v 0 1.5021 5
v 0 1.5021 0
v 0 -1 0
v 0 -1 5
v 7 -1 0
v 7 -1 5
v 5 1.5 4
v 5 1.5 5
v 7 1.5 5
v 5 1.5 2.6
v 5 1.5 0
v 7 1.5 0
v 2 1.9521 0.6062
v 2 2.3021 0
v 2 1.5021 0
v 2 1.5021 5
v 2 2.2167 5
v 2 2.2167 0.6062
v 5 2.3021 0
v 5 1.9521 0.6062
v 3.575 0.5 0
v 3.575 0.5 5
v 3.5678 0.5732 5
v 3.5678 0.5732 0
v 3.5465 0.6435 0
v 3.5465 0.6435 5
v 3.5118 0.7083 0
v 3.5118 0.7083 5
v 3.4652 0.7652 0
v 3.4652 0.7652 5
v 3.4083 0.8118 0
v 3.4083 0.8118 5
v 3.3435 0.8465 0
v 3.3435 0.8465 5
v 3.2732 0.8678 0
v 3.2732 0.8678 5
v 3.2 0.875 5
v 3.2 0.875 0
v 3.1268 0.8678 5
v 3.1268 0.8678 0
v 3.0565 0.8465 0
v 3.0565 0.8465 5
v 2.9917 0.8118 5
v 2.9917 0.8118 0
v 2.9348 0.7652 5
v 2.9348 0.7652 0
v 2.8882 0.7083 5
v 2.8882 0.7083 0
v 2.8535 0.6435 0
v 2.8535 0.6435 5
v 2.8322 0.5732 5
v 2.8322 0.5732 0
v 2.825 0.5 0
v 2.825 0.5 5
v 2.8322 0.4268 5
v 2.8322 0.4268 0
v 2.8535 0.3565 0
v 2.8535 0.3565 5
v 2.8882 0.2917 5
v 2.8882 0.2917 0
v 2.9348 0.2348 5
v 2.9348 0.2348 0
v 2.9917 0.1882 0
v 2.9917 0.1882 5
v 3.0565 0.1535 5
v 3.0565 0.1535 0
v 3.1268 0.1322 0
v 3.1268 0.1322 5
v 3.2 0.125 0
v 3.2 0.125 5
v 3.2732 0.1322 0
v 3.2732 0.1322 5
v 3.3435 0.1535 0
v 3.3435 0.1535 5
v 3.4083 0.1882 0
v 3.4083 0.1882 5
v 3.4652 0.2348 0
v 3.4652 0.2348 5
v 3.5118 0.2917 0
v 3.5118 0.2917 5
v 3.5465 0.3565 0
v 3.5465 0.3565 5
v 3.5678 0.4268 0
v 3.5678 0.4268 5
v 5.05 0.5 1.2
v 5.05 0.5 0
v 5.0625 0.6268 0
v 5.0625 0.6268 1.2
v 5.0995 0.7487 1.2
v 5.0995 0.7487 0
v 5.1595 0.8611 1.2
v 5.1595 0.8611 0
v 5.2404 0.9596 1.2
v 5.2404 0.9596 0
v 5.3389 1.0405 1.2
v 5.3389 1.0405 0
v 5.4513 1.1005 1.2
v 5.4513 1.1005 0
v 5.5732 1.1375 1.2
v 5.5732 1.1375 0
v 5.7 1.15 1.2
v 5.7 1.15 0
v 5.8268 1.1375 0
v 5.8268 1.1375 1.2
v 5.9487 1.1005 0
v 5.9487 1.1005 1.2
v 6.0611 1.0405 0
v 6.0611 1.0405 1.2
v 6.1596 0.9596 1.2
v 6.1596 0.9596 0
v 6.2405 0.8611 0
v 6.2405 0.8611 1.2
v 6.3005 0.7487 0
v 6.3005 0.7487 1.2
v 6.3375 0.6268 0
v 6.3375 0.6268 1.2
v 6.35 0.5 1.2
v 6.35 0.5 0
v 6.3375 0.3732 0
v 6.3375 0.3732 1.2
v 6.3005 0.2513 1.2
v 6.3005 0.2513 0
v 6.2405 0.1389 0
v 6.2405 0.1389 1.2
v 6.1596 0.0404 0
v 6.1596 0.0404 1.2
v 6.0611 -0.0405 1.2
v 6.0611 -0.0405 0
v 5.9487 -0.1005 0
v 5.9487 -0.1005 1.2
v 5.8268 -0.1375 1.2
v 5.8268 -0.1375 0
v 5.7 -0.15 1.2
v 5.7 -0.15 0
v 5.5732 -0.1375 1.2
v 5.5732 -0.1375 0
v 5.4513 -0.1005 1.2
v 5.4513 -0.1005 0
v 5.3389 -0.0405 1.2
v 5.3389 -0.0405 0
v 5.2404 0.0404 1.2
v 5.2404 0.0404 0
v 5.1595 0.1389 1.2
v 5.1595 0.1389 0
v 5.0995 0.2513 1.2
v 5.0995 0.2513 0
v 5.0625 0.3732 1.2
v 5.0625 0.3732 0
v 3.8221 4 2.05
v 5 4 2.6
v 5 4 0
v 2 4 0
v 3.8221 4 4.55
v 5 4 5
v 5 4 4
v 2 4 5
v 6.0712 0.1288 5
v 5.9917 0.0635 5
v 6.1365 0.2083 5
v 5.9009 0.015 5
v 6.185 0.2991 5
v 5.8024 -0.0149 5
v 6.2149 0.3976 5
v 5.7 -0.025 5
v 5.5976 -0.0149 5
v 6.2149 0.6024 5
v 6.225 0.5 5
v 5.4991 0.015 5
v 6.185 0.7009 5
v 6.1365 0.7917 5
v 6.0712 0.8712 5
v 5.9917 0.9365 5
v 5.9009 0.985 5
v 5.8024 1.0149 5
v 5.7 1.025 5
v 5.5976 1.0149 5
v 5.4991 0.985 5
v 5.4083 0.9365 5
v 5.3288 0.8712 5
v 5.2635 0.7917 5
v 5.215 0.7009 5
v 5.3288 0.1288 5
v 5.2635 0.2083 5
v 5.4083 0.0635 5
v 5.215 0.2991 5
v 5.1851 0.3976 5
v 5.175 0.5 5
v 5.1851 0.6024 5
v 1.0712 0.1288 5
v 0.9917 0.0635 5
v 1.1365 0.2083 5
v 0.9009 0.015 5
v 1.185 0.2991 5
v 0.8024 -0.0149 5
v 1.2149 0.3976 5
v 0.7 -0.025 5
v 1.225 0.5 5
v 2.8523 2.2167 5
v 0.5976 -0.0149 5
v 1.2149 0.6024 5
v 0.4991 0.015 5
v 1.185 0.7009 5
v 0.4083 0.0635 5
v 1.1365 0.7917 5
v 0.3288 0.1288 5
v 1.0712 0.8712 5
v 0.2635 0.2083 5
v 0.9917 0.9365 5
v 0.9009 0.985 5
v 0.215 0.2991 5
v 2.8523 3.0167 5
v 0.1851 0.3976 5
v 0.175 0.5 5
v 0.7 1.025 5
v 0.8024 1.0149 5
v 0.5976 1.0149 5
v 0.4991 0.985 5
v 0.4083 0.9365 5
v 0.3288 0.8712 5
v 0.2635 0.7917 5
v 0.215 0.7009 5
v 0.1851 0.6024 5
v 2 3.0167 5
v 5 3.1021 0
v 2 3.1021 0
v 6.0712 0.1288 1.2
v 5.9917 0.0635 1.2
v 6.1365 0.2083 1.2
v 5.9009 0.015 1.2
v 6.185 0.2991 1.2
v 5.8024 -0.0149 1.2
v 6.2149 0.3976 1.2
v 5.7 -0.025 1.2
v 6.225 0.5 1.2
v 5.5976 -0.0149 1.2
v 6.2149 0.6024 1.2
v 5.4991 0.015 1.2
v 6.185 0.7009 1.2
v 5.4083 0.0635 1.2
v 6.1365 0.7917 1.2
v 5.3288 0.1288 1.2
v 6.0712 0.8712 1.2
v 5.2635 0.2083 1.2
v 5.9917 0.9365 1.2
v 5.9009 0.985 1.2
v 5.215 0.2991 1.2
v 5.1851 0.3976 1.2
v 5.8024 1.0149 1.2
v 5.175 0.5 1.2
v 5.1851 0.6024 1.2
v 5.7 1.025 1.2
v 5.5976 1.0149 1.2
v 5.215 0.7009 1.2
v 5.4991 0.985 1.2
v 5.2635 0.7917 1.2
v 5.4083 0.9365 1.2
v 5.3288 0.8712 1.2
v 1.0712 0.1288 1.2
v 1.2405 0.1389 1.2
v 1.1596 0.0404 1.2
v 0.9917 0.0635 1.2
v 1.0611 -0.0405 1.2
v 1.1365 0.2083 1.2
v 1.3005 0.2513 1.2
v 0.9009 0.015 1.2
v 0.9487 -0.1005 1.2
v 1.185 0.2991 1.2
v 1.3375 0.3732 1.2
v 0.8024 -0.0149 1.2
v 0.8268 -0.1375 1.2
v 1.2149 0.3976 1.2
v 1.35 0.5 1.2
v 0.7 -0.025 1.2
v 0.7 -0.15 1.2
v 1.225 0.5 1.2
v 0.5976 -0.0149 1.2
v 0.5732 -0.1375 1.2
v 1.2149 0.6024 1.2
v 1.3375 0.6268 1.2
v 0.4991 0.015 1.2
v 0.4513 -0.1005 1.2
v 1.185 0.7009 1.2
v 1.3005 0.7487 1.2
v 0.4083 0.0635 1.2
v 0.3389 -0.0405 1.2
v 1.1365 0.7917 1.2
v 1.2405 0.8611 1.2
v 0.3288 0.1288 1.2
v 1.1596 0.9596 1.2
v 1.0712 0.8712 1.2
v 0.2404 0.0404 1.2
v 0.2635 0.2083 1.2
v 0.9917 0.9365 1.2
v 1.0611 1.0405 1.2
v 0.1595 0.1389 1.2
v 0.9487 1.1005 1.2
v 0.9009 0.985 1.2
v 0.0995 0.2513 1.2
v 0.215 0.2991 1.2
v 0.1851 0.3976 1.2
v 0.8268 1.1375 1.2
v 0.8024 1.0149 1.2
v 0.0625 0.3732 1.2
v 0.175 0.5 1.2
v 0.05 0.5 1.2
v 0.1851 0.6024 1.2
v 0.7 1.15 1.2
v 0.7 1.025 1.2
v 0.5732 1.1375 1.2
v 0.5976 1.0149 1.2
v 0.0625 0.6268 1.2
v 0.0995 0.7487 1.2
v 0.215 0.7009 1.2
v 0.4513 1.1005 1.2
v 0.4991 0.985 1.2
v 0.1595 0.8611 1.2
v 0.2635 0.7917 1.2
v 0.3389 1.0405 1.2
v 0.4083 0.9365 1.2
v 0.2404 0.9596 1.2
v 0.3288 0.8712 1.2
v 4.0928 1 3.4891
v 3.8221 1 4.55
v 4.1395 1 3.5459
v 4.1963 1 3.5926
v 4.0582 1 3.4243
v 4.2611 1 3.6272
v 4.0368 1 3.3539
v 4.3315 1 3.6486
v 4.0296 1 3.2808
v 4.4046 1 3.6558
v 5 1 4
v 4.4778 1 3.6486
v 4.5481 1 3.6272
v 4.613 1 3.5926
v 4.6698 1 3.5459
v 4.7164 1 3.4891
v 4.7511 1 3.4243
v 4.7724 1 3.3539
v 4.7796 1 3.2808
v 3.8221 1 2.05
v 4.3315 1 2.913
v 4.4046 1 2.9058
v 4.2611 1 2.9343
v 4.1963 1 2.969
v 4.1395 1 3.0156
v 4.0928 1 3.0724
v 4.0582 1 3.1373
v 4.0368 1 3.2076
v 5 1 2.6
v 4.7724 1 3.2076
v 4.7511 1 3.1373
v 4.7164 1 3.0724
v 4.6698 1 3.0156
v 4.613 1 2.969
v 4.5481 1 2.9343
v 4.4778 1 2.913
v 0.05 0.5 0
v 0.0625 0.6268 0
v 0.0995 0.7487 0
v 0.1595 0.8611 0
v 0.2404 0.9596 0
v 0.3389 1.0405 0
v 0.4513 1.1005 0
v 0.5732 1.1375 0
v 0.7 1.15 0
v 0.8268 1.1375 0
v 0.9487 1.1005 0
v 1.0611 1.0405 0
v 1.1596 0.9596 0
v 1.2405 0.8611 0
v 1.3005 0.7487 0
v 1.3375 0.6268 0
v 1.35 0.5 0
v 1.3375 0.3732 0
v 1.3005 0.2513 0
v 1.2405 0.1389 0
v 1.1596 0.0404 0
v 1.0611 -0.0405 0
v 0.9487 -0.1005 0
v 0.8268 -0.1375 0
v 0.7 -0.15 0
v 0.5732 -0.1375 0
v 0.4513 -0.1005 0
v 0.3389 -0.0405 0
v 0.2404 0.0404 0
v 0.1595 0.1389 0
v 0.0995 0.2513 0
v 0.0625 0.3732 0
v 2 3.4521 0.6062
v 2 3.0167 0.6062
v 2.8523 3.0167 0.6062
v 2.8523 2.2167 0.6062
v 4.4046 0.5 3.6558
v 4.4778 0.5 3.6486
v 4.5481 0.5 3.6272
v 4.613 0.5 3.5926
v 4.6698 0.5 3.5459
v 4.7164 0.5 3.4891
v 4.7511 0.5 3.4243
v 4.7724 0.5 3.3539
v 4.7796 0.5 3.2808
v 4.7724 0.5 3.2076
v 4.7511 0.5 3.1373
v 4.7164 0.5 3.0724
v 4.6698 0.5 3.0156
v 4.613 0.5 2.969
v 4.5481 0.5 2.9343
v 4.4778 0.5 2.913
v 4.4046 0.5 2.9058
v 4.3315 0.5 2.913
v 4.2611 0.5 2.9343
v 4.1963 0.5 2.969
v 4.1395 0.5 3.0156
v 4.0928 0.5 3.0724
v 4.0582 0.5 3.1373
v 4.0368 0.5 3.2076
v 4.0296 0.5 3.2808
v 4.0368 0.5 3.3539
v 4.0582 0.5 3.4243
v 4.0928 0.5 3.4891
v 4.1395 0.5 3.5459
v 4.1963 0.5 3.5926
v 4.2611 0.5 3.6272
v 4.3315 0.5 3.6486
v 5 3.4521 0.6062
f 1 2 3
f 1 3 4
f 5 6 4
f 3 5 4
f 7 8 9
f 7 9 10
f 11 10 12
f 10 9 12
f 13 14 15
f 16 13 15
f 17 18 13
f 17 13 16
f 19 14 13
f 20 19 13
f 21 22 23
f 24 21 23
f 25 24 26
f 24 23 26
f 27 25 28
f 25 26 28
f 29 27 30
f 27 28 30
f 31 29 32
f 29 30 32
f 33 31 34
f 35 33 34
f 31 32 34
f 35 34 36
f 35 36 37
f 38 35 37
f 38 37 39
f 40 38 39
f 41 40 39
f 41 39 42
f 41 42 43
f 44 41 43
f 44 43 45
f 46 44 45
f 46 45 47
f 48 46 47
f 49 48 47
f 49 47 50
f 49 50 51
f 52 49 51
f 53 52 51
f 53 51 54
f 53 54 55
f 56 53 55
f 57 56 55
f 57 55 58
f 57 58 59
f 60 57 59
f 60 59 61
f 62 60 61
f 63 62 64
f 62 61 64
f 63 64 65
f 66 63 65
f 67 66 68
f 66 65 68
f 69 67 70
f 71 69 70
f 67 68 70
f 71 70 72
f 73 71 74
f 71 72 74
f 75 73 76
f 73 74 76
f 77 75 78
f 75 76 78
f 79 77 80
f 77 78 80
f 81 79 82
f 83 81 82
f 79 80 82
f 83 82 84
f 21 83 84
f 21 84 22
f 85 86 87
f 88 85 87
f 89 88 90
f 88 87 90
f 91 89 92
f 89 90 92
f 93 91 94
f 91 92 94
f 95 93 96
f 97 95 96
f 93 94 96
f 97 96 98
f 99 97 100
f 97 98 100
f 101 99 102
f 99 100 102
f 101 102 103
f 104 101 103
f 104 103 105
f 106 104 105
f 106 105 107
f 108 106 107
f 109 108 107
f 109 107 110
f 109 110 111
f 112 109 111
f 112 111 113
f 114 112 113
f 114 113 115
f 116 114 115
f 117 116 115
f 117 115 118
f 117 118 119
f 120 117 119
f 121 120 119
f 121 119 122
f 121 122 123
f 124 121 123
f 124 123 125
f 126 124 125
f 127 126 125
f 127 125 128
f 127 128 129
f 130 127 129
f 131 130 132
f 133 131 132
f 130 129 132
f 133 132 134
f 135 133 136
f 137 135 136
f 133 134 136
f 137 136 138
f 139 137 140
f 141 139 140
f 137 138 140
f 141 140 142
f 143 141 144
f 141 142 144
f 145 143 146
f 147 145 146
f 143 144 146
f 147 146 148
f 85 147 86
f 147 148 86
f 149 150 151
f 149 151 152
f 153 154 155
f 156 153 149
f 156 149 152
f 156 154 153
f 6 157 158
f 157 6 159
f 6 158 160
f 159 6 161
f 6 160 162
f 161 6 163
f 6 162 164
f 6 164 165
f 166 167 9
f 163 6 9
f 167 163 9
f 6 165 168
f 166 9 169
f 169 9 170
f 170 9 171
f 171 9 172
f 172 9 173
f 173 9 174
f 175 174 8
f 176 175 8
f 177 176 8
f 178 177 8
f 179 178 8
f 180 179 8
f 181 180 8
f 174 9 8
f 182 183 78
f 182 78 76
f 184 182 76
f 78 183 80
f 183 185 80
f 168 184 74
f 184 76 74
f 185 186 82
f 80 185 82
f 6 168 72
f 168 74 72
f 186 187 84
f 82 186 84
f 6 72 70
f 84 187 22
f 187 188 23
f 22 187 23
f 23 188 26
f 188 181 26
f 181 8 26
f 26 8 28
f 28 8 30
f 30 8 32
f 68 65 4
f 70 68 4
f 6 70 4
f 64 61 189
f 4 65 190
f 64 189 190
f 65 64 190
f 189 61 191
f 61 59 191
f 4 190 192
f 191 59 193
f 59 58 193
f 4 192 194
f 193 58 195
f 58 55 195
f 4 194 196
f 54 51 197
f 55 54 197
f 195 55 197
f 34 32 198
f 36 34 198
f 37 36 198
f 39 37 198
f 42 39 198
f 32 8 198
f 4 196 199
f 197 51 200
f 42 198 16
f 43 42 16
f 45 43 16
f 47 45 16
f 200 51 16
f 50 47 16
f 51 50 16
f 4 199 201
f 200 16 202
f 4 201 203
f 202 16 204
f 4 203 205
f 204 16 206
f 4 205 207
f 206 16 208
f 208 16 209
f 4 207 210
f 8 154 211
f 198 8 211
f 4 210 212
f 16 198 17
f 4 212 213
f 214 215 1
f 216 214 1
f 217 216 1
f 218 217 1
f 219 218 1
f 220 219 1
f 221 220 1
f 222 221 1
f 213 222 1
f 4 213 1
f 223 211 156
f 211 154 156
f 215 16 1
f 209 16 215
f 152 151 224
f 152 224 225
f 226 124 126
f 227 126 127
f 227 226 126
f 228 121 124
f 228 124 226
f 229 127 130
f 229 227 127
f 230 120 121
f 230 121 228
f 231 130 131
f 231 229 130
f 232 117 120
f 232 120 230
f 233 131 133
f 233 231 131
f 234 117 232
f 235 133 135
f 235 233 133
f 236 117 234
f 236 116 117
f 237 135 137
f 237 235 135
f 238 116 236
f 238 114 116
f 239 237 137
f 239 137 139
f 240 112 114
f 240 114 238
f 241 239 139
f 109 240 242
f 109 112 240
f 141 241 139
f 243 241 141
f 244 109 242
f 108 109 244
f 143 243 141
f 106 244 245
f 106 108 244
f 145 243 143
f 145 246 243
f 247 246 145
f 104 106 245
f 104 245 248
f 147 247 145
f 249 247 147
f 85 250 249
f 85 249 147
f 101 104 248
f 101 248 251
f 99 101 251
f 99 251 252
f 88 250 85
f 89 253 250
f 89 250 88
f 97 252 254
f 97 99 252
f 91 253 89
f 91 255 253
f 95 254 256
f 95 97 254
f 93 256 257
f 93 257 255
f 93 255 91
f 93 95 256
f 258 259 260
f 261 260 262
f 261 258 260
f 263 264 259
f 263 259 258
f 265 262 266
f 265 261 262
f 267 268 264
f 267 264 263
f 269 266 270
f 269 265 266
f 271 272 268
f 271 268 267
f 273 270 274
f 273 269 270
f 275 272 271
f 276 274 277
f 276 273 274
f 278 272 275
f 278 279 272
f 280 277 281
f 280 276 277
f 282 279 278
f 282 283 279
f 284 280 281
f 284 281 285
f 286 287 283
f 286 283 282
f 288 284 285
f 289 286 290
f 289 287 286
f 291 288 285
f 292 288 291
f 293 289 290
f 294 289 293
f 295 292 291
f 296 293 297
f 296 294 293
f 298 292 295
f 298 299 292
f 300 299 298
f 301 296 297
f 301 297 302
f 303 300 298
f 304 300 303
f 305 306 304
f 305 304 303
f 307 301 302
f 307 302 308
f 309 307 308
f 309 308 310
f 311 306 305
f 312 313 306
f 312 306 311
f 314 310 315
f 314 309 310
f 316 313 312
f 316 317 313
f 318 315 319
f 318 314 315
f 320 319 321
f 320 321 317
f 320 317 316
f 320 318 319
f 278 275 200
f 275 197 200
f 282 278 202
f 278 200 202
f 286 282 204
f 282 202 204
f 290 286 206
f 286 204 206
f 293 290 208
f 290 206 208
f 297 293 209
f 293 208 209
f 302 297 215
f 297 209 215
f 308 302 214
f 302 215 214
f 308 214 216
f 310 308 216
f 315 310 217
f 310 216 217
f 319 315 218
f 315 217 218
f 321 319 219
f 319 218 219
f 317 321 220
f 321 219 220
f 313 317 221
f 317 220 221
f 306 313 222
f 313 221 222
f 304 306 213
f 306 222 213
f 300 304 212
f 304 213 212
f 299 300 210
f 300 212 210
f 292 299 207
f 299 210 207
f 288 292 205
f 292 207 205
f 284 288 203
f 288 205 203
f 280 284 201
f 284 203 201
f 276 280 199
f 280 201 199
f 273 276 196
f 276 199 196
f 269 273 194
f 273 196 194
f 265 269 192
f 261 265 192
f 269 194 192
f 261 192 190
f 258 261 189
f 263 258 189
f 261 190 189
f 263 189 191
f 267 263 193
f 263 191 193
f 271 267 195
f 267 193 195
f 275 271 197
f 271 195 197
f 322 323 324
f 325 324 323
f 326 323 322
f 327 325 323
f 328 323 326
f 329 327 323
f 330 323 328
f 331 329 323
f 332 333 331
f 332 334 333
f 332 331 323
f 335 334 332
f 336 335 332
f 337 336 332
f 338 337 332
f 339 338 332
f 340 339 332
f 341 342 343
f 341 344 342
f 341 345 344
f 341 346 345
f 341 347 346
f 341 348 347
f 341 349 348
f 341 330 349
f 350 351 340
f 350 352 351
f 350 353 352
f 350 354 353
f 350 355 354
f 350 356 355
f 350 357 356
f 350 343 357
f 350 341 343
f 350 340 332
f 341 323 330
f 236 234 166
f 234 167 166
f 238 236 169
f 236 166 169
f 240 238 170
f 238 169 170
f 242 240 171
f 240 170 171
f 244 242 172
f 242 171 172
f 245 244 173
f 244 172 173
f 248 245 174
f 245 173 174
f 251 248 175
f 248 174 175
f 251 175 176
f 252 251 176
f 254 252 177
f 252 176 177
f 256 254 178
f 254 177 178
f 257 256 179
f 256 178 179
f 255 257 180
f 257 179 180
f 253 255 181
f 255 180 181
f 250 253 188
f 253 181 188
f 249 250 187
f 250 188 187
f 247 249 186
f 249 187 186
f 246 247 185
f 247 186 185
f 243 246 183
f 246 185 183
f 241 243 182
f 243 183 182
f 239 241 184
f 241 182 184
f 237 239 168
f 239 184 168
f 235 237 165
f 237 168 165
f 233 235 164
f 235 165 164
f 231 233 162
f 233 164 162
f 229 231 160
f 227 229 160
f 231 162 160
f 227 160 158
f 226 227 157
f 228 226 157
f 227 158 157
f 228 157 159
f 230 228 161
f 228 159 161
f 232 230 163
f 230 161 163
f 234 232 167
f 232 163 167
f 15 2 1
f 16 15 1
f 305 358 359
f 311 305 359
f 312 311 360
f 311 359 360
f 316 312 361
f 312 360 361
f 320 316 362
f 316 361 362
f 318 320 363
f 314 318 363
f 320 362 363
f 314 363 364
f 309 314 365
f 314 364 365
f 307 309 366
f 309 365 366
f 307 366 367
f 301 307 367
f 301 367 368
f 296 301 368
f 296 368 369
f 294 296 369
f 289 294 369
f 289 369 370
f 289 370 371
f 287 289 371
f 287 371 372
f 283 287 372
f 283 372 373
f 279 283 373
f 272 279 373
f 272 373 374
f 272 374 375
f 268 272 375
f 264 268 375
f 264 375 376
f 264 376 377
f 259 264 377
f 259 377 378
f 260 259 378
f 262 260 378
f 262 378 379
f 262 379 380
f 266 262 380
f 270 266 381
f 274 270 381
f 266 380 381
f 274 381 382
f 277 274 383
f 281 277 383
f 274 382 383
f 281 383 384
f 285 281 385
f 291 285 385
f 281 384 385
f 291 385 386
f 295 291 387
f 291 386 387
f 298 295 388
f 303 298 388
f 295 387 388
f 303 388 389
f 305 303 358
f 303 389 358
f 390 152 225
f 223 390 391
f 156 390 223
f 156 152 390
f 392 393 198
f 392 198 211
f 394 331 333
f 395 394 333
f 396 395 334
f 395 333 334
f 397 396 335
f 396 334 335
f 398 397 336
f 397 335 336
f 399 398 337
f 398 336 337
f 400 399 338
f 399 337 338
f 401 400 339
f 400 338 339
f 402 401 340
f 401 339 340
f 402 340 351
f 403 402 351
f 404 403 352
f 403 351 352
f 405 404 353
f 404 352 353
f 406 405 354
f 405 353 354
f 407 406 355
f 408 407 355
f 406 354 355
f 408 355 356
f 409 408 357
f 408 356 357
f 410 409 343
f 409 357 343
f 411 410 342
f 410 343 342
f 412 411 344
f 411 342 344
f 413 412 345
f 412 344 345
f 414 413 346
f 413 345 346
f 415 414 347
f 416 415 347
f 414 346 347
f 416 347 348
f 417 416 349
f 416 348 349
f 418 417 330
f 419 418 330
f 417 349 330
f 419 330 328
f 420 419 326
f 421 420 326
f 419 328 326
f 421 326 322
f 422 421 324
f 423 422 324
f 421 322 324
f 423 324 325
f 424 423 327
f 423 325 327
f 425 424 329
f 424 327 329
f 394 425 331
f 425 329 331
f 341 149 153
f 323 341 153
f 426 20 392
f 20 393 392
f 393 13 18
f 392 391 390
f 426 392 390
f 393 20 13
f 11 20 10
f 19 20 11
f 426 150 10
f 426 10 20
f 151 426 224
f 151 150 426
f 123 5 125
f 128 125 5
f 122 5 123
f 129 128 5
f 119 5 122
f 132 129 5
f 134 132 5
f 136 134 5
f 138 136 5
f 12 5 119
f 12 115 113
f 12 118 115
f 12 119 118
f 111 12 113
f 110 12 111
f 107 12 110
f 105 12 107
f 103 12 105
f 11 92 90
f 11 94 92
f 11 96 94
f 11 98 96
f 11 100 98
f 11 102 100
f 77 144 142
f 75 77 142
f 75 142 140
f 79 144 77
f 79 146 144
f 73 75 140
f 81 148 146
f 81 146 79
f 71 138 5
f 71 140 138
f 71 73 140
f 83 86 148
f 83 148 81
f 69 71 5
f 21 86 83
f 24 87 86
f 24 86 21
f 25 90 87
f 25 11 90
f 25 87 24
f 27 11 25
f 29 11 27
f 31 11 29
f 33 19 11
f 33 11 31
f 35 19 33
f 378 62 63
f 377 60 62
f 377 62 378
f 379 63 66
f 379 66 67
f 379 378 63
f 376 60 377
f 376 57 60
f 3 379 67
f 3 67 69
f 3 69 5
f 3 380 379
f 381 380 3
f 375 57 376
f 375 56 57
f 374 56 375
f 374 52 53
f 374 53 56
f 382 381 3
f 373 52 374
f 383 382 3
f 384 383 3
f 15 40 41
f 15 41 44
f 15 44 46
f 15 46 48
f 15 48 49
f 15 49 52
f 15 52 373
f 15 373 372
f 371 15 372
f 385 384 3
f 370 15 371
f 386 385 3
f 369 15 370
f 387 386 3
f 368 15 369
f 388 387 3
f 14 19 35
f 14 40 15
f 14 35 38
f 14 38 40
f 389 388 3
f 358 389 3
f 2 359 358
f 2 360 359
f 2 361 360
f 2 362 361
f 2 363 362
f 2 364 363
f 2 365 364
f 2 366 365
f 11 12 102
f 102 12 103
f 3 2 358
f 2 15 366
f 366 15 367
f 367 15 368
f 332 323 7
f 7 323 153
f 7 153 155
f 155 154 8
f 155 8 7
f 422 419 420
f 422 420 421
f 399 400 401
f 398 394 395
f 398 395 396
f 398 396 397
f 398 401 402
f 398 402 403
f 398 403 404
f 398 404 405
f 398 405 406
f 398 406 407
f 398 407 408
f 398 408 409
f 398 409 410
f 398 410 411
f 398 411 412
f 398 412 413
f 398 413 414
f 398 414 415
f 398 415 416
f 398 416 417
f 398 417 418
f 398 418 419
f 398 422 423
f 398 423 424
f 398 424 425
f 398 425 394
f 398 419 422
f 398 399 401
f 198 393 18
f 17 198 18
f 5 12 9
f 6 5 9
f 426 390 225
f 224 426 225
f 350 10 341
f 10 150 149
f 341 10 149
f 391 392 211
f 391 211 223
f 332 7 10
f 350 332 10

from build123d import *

# Parameters (mm, degrees)
SKETCH1_W                = 7
SKETCH1_H                = 5
BOSS_EXTRUDE1_DEPTH      = 5
HOLE1_D                  = 1.05
HOLE1_CBORE_D            = 1.3
HOLE1_CBORE_DEPTH        = 1.2
SKETCH20_W               = 5
SKETCH20_H               = 2.5
CUT_EXTRUDE11_DEPTH      = 2
M1_0X0_25_TAPPED_HOLE1_D = 0.75
SKETCH37_W               = 5
SKETCH37_H               = 2.5
CUT_EXTRUDE13_DEPTH      = 2
CUT_EXTRUDE15_DEPTH      = 3
CUT_EXTRUDE16_DEPTH      = 9.124038405
SKETCH45_R               = 0.375
CUT_EXTRUDE18_DEPTH      = 0.5
SKETCH44_W               = 0.852349788
SKETCH44_H               = 0.8
CUT_EXTRUDE19_DEPTH      = 4.5


with BuildPart() as part:
    # Sketch1 → Boss-Extrude1 (new body)
    with BuildSketch(Plane(origin=(0, 4, 0), x_dir=(-1, 0, 0), z_dir=(0, 1, 0))):
        with Locations((-3.5, 2.5)):
            Rectangle(SKETCH1_W, SKETCH1_H)
    extrude(amount=-BOSS_EXTRUDE1_DEPTH)

    # Hole1 (through all)
    with Locations(Plane(origin=(0, 0, 0), x_dir=(-1, 0, 0), z_dir=(0, 0, -1))):
        with Locations((-5.7, 0.5), (-0.7, 0.5)):
            CounterBoreHole(HOLE1_D / 2, HOLE1_CBORE_D / 2, HOLE1_CBORE_DEPTH)

    # Sketch20 → Cut-Extrude11 (cut)
    with BuildSketch(Plane(origin=(7, 0, 0), x_dir=(0, 0, -1), z_dir=(1, 0, 0))):
        with Locations((-2.5, 2.75)):
            Rectangle(SKETCH20_W, SKETCH20_H)
    extrude(amount=-CUT_EXTRUDE11_DEPTH, mode=Mode.SUBTRACT)

    # M1.0x0.25 Tapped Hole1 (through all)
    with Locations(Plane(origin=(0, 0, 0), x_dir=(-1, 0, 0), z_dir=(0, 0, -1))):
        with Locations((-3.2, 0.5)):
            Hole(M1_0X0_25_TAPPED_HOLE1_D / 2)

    # Sketch37 → Cut-Extrude13 (cut)
    with BuildSketch(Plane.ZY):
        with Locations((2.5, 2.752068207)):
            Rectangle(SKETCH37_W, SKETCH37_H)
    extrude(amount=-CUT_EXTRUDE13_DEPTH, mode=Mode.SUBTRACT)

    # Sketch41 → Cut-Extrude15 (cut)
    with BuildSketch(Plane(origin=(0, 4, 0), x_dir=(1, 0, 0), z_dir=(0, 1, 0))):
        Polygon((5, -2.6), (3.822078101, -2.05), (3.822078101, -4.55), (5, -4), align=None)
    extrude(amount=-CUT_EXTRUDE15_DEPTH, mode=Mode.SUBTRACT)

    # Sketch43 → Cut-Extrude16 (cut, through all)
    with BuildSketch(Plane.ZY.offset(-2)):
        Polygon((0, 2.302068207), (0.606217783, 1.952068207), (0.606217783, 3.452068207), (0, 3.102068207), align=None)
    extrude(amount=-CUT_EXTRUDE16_DEPTH, mode=Mode.SUBTRACT)

    # Sketch45 → Cut-Extrude18 (cut)
    with BuildSketch(Plane(origin=(0, 1, 0), x_dir=(1, 0, 0), z_dir=(0, 1, 0))):
        with Locations(Location((4.404643106, -3.280769975, 0), (0, 0, 270))):
            Circle(SKETCH45_R)
    extrude(amount=-CUT_EXTRUDE18_DEPTH, mode=Mode.SUBTRACT)

    # Sketch44 → Cut-Extrude19 (cut)
    with BuildSketch(Plane(origin=(0, 0, 0.606217783), x_dir=(-1, 0, 0), z_dir=(0, 0, -1))):
        with Locations((-2.426174894, 2.616682439)):
            Rectangle(SKETCH44_W, SKETCH44_H)
    extrude(amount=-CUT_EXTRUDE19_DEPTH, mode=Mode.SUBTRACT)


solid = part.part
